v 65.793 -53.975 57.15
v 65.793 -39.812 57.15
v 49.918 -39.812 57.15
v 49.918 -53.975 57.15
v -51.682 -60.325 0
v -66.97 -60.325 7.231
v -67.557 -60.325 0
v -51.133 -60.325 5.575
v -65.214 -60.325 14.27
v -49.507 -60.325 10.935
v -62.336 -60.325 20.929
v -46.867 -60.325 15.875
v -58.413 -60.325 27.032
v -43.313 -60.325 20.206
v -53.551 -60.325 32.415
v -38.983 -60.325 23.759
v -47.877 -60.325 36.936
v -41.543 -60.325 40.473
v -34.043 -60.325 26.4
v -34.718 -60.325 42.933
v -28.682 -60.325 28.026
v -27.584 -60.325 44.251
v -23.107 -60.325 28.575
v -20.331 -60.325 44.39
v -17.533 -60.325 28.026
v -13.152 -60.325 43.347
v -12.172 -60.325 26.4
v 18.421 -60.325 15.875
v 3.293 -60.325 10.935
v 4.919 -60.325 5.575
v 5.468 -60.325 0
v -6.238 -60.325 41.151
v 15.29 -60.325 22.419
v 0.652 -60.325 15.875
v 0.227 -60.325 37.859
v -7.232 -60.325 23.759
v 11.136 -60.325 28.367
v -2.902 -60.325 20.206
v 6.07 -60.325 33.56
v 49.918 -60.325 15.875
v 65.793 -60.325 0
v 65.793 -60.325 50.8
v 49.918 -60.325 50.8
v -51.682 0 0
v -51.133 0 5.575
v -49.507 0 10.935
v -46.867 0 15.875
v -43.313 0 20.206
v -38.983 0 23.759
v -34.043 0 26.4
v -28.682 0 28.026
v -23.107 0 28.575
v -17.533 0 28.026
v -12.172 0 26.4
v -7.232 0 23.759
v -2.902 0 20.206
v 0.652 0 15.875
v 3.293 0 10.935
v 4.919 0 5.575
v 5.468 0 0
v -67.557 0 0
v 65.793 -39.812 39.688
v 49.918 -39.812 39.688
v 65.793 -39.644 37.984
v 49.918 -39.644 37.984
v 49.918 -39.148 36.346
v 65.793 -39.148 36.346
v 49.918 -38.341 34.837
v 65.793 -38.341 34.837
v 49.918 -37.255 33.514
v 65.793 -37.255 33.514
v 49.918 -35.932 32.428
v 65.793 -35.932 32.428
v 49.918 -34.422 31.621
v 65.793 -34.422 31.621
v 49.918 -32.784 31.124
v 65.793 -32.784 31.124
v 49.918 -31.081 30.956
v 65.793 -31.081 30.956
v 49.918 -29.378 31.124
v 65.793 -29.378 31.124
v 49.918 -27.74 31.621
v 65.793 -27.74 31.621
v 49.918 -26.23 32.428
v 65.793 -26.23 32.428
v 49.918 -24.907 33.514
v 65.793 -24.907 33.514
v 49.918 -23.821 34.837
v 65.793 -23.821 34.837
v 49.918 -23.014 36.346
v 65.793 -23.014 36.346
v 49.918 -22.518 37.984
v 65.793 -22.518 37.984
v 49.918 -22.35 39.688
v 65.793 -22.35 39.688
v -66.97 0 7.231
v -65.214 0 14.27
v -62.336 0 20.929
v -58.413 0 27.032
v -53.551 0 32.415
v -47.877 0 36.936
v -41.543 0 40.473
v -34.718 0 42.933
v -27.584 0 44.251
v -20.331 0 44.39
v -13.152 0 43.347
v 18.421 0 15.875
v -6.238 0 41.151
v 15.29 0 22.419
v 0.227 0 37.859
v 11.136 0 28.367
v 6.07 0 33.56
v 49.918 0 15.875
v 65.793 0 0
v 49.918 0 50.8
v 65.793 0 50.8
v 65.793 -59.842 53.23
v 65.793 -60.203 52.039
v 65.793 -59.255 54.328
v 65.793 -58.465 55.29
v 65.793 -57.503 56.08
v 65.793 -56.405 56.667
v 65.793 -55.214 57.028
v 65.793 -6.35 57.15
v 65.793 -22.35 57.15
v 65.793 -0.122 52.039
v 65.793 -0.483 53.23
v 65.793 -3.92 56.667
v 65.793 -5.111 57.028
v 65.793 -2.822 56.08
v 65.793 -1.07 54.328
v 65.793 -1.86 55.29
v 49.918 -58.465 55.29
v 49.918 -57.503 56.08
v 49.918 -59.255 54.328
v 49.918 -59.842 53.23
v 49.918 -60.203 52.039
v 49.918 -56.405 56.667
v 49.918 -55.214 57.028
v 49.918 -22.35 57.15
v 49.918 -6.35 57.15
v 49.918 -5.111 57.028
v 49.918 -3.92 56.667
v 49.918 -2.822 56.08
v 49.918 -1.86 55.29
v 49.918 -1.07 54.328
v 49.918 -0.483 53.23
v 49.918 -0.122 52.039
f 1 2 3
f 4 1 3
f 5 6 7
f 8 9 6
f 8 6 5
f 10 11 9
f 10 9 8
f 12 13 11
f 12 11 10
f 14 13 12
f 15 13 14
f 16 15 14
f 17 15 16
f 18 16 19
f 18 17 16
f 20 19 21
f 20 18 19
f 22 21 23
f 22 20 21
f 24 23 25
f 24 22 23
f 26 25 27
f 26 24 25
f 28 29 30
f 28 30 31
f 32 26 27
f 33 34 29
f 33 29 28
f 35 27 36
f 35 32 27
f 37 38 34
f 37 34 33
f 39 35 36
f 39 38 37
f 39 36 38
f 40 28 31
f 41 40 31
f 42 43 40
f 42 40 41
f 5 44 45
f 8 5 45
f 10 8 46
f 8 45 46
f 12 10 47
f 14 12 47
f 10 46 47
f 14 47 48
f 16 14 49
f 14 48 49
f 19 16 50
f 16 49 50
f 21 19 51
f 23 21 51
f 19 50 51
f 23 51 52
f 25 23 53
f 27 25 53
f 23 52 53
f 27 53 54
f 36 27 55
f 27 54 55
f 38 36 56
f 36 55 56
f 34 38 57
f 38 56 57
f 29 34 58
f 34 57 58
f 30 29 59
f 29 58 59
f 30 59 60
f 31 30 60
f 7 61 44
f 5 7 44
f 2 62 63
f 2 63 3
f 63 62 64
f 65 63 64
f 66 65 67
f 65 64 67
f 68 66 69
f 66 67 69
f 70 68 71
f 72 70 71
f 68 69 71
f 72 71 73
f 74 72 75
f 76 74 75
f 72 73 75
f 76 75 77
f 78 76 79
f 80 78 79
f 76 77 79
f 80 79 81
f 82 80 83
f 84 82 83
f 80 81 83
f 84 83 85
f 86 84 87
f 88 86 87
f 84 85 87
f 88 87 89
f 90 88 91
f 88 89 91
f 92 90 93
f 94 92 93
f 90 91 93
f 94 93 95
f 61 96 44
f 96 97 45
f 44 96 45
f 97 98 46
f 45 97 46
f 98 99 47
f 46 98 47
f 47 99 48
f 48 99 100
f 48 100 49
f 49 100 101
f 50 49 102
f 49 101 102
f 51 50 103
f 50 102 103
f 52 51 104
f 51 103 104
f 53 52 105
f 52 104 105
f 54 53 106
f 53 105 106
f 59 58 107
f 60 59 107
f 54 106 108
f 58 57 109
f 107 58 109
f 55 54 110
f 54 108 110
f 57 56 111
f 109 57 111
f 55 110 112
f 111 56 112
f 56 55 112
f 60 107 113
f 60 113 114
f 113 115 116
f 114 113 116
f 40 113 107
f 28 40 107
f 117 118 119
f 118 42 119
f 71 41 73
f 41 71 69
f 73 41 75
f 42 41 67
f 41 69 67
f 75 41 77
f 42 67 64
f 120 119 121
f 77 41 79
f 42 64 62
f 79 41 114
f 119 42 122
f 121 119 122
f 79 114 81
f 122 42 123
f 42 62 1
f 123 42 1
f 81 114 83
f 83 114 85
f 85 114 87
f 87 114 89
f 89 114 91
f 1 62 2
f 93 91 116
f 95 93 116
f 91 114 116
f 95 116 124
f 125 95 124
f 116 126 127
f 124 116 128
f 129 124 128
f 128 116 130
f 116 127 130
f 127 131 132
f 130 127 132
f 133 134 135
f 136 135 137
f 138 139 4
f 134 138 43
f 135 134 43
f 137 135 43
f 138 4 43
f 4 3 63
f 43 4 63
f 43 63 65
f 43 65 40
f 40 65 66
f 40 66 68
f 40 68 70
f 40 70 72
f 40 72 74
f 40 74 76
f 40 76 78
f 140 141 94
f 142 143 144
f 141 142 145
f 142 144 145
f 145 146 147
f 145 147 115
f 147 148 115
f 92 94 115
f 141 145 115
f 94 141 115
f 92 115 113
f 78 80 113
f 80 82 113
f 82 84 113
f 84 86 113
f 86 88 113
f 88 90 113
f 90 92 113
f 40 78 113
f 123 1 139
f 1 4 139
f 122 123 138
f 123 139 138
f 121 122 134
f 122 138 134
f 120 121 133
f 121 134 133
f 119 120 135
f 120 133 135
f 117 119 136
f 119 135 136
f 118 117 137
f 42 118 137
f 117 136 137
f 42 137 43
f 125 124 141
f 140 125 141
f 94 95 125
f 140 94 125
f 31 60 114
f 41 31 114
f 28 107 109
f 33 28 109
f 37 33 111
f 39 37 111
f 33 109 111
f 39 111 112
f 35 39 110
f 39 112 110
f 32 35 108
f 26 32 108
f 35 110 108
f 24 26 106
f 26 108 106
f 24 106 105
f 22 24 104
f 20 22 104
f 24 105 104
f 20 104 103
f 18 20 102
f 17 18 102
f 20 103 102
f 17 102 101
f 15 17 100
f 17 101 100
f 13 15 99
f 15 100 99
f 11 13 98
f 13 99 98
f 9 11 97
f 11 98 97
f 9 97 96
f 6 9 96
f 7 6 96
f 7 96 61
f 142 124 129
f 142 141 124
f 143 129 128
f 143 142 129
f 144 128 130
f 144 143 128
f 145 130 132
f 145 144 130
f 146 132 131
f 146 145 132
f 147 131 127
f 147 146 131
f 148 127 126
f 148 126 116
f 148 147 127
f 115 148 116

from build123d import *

# Parameters (mm, degrees)
F1_DEPTH = 60.325
F2_R     = 6.35
F3_R     = 6.35
F4_W     = 17.4625
F4_H     = 17.4625
F5_DEPTH = 25.4


with BuildPart() as f1:
    # F0 (on Front) → F1 (new body)
    with BuildSketch(Plane.XZ):
        with BuildLine():
            ThreePointArc((18.421305, 15.875), (-31.178134, 43.737725), (-67.557349, 0))
            Line((-67.557349, 0), (-51.682349, 0))
            ThreePointArc((-51.682349, 0), (-23.107349, 28.575), (5.467651, 0))
            Line((5.467651, 0), (65.792651, 0))
            Line((65.792651, 0), (65.792651, 57.15))
            Line((65.792651, 57.15), (49.917651, 57.15))
            Line((49.917651, 57.15), (49.917651, 15.875))
            Line((49.917651, 15.875), (18.421305, 15.875))
        make_face()
    extrude(amount=F1_DEPTH)

    # F2
    f2_edges = [f1.edges().sort_by_distance(p)[0] for p in [
        (57.855151, -60.325, 57.15),
    ]]
    fillet(f2_edges, radius=F2_R)

    # F3
    f3_edges = [f1.edges().sort_by_distance(p)[0] for p in [
        (57.855151, 0, 57.15),
    ]]
    fillet(f3_edges, radius=F3_R)

    # F4 (on face) → F5 (cut)
    with BuildSketch(Plane.YZ.offset(65.792651)):
        with Locations((-31.080982, 48.41875)):
            Rectangle(F4_W, F4_H)
        with BuildLine():
            Line((-22.349732, 39.6875), (-39.812232, 39.6875))
            ThreePointArc((-39.812232, 39.6875), (-31.080982, 30.95625), (-22.349732, 39.6875))
        make_face()
    extrude(amount=-F5_DEPTH, mode=Mode.SUBTRACT)


solid = f1.part
